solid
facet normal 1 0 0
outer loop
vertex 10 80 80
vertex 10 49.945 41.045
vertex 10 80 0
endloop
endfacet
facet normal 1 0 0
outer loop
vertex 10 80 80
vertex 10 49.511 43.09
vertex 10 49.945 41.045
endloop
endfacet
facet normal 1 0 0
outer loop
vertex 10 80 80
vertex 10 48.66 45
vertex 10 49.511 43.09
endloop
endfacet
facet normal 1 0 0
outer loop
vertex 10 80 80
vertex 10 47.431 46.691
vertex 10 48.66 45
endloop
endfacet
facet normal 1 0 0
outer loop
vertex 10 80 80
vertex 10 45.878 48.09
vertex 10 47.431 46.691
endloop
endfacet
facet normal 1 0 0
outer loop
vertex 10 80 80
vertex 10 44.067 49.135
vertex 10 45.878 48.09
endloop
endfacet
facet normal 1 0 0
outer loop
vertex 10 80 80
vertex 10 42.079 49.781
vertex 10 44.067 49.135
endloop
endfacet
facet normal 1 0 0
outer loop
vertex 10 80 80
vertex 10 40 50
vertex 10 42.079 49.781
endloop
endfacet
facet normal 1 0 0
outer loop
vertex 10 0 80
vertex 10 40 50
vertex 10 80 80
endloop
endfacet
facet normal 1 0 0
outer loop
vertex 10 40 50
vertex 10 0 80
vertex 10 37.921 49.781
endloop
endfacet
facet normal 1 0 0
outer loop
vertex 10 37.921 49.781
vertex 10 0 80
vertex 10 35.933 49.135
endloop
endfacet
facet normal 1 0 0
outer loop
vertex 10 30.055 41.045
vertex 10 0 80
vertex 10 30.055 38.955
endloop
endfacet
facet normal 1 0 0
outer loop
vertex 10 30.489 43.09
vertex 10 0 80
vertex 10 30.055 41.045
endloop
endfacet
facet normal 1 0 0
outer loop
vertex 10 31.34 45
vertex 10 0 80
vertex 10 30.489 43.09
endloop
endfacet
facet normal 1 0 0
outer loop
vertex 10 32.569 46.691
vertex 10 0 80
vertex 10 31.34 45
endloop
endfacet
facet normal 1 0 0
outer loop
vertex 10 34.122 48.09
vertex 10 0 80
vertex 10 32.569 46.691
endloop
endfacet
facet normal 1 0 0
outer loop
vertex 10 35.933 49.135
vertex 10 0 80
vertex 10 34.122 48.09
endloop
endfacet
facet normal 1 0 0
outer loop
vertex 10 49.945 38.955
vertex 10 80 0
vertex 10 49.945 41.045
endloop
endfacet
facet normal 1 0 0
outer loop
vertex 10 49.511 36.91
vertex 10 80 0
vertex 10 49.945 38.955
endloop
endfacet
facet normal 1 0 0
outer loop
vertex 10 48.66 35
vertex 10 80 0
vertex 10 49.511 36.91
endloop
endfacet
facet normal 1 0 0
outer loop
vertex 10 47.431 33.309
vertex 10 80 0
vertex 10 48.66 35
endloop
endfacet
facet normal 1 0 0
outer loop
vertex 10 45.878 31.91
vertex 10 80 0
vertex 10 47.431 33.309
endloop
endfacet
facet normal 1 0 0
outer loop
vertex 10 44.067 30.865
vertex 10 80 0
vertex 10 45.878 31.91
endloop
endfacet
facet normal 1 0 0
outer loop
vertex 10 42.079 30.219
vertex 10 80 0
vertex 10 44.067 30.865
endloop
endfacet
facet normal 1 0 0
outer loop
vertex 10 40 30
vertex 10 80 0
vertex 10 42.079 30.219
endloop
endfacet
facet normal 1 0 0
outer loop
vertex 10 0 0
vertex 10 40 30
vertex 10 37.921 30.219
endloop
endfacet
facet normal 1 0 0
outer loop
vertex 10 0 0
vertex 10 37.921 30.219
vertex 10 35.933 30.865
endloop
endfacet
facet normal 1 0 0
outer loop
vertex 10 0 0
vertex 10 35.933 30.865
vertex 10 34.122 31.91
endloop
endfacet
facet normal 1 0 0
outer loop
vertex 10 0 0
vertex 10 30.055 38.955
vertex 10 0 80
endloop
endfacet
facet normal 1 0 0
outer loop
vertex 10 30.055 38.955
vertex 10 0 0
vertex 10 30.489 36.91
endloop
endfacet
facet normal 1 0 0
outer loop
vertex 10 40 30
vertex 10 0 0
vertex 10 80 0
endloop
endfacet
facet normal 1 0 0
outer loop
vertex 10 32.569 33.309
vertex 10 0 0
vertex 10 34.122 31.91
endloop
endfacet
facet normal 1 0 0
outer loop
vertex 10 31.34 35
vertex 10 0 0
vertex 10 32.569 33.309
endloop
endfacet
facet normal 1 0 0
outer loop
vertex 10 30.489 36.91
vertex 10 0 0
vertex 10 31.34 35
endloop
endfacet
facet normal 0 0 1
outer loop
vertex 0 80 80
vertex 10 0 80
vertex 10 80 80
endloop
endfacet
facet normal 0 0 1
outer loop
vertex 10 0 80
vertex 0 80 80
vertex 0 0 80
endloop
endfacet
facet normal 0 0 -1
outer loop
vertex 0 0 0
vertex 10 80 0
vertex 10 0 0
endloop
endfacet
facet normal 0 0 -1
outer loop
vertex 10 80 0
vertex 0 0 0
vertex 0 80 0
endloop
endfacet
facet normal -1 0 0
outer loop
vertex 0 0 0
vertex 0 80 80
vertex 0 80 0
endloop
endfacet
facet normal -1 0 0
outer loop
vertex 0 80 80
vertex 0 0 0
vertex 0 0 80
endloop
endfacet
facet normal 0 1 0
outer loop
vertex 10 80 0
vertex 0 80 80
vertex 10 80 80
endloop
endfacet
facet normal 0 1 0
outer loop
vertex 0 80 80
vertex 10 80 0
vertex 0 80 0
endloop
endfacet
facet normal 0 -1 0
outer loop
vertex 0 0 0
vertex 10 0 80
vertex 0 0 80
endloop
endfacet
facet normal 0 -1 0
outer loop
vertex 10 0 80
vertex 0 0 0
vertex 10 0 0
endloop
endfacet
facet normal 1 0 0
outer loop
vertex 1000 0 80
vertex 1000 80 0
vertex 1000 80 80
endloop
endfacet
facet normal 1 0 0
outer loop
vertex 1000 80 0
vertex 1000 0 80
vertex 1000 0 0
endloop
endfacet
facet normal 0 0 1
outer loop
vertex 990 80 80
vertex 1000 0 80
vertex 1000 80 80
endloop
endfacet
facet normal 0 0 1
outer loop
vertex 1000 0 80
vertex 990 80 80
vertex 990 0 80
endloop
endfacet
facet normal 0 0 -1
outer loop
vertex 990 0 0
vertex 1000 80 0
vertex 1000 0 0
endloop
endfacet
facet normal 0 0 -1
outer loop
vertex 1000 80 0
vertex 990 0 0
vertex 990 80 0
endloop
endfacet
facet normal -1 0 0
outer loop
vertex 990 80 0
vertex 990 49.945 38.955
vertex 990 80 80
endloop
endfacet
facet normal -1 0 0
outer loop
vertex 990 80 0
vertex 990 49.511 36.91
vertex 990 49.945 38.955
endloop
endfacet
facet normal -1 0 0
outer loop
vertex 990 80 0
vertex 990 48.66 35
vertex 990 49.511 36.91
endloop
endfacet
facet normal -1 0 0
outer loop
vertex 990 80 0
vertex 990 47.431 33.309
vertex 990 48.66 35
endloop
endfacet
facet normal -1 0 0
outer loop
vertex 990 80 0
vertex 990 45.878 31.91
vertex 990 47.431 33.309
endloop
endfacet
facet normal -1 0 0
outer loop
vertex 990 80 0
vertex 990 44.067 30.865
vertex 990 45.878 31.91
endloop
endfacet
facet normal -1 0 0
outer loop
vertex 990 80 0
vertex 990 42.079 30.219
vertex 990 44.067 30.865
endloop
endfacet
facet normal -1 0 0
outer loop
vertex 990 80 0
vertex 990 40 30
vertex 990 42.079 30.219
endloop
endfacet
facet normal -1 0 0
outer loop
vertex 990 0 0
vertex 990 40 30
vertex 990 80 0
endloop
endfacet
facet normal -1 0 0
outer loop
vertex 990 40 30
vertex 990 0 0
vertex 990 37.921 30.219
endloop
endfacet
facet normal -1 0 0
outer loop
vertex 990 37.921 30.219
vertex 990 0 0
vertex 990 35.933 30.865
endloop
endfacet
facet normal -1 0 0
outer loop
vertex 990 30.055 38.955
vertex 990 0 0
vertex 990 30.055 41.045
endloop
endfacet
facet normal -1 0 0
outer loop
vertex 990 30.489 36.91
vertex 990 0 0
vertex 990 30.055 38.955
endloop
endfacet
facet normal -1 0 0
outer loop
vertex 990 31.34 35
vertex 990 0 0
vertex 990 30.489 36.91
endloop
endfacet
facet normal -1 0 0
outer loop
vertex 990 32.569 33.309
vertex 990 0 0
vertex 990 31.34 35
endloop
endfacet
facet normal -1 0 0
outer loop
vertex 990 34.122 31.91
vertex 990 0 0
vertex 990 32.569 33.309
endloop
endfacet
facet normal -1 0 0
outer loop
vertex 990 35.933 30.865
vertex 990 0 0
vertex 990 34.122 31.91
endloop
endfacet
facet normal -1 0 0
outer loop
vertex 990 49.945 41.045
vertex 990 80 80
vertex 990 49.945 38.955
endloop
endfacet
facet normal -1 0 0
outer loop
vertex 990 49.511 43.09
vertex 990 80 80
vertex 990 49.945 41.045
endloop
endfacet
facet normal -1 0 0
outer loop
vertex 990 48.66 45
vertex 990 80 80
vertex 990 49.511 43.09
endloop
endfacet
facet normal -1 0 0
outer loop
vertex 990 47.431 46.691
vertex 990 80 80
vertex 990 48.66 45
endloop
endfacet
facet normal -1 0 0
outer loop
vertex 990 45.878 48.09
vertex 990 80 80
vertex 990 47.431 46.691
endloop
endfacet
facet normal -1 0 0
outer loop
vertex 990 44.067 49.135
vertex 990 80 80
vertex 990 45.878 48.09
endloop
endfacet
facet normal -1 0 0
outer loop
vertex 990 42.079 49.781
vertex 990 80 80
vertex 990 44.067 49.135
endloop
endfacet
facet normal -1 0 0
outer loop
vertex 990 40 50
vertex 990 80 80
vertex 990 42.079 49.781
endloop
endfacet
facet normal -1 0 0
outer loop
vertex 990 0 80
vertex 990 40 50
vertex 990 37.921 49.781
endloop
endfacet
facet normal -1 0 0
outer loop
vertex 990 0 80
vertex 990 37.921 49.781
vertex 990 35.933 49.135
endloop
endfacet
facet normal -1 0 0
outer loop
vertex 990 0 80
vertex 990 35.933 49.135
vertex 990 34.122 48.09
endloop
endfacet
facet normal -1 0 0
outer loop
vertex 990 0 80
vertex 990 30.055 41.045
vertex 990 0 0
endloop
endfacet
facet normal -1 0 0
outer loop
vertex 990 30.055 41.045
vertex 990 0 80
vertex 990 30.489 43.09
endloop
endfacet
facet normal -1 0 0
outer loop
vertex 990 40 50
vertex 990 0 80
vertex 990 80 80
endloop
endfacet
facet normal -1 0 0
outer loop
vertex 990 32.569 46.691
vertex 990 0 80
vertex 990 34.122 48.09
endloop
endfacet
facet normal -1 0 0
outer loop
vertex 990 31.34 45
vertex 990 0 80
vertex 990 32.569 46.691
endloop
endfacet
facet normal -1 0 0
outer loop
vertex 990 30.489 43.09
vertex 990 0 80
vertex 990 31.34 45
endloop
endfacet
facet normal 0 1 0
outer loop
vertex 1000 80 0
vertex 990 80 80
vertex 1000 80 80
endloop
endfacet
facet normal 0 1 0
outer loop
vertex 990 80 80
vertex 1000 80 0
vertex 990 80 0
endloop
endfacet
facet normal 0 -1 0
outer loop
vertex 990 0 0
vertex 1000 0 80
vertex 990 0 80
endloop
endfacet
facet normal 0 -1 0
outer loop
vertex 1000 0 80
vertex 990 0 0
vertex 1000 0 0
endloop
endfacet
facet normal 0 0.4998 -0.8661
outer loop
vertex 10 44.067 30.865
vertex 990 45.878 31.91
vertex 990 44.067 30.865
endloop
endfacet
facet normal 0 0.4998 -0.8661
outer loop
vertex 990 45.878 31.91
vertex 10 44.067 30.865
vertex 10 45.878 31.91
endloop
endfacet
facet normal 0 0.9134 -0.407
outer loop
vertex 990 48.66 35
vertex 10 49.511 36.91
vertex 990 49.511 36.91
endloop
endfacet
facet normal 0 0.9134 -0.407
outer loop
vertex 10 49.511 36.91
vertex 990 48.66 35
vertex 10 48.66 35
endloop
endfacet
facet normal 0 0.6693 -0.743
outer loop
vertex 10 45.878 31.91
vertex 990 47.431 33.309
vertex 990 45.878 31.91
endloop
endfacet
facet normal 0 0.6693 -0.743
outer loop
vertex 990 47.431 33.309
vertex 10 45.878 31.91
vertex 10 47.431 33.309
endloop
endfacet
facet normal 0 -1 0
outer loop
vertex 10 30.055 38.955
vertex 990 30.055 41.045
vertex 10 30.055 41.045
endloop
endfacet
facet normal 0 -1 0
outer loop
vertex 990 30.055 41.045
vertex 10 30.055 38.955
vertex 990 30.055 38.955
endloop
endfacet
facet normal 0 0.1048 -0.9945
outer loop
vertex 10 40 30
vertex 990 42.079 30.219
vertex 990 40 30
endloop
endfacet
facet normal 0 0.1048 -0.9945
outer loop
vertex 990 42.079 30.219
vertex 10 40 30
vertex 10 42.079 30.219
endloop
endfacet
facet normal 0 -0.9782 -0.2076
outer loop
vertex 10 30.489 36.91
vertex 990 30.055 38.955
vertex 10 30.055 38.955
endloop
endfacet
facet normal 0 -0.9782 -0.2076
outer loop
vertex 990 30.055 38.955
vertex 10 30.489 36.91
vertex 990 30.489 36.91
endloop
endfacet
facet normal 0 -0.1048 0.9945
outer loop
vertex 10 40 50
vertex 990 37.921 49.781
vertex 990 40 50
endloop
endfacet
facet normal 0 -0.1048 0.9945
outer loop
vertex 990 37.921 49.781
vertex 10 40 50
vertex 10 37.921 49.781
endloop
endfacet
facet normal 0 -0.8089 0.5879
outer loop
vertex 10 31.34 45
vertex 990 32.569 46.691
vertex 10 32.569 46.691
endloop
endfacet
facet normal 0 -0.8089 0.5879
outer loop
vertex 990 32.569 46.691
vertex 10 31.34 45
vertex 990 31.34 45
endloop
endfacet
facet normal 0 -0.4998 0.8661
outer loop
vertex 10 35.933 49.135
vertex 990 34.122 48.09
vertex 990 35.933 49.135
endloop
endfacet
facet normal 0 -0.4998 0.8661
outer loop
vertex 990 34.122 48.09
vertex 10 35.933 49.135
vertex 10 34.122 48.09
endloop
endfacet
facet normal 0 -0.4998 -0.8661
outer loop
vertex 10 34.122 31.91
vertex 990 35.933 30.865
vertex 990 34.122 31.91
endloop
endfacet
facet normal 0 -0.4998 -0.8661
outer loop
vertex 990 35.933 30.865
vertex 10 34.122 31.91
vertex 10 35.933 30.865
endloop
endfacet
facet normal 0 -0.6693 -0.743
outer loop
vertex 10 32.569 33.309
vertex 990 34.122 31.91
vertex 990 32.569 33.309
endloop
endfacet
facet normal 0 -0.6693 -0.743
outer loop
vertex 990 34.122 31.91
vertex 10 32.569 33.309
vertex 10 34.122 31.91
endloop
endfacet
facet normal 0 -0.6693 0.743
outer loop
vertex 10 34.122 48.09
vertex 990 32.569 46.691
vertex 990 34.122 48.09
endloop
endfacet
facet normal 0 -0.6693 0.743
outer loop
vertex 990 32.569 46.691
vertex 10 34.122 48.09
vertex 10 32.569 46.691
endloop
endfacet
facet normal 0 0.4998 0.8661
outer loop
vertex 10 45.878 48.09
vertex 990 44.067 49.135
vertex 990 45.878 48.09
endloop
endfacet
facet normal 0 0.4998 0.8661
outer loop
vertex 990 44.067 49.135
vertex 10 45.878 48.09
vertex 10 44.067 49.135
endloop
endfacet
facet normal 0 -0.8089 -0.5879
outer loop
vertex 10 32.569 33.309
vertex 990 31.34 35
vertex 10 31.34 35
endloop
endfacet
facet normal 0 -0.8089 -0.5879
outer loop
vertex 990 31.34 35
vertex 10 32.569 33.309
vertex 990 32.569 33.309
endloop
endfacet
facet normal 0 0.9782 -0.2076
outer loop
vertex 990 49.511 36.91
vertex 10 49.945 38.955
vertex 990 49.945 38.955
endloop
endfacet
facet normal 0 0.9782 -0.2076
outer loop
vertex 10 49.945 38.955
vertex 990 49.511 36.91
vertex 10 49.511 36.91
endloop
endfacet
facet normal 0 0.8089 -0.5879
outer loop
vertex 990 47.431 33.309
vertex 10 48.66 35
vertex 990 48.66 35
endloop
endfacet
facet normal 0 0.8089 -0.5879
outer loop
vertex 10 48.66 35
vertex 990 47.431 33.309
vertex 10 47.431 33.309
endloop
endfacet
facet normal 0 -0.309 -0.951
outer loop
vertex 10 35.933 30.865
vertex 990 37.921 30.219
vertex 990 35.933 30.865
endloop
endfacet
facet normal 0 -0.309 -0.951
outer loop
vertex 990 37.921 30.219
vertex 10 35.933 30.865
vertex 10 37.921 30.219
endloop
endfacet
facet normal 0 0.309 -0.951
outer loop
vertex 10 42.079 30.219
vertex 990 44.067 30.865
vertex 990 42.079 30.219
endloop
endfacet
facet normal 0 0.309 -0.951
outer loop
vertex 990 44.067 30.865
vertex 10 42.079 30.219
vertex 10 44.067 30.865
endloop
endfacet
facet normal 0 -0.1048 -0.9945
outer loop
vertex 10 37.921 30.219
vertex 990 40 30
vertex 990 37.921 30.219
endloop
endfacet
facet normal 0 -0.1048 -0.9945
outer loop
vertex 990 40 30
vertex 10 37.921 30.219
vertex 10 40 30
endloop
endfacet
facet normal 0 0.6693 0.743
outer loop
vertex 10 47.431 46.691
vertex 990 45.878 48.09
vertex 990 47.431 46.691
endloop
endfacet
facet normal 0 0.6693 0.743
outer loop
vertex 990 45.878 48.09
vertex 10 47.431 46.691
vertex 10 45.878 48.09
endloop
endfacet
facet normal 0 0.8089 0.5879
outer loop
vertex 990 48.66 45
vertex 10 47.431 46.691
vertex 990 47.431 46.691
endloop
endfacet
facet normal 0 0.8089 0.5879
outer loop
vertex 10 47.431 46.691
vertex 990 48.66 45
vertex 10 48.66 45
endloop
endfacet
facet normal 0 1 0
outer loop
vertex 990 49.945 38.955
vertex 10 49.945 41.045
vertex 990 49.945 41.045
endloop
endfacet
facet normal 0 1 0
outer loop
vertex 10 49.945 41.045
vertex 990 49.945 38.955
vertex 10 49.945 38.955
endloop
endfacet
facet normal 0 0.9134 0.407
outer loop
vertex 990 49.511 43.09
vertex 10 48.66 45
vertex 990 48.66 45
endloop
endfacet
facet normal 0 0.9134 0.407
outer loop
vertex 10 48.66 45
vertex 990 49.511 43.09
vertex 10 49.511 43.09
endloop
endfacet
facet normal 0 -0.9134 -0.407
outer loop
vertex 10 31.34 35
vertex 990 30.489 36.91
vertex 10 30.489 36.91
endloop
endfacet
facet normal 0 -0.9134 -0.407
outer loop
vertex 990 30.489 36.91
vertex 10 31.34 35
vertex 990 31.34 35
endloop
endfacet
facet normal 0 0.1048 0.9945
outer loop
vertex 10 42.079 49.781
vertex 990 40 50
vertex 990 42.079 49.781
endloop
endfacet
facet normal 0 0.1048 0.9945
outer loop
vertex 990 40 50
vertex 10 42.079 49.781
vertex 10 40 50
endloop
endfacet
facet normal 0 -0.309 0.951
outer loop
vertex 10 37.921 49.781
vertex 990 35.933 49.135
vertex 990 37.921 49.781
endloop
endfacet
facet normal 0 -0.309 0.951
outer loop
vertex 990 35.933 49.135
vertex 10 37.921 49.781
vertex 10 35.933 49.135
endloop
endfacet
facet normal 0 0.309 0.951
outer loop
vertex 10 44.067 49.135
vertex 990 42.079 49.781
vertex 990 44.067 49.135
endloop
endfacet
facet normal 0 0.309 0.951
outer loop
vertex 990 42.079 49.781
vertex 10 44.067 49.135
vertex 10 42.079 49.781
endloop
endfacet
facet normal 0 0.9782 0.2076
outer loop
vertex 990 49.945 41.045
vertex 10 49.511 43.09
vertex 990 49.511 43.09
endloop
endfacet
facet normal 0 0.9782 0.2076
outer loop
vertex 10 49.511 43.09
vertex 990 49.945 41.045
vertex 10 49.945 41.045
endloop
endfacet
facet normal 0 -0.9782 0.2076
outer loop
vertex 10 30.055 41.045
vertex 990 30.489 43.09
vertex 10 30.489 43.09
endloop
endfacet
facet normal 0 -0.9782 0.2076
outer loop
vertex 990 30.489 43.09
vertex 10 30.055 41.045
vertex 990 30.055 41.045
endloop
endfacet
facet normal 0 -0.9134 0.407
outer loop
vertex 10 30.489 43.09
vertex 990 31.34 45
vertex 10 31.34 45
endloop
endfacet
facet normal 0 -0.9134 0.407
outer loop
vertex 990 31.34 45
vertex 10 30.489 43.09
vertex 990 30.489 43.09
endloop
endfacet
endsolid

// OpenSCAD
/*

    Hanger
    
    By Anton Augustsson


*/



module hanger (
    rodDiameter,
    rodLength,
    x,y,z
    ){
/*
    ---------- Local varibles ---------- 
*/

mountWidth = rodDiameter*4;
mountThickness = rodDiameter/2;
        
/*
    ---------- Code ---------- 
*/

color("BurlyWood")
translate([
    x,
    y,
    z]) 
union () {
    
// Left mount width
translate([
    0,
    0,
    0]) 
cube(size = [
    mountThickness,
    mountWidth,
    mountWidth]);

// Right mount width
translate([
    rodLength-mountThickness,
    0,
    0]) 
cube(size = [
    mountThickness,
    mountWidth,
    mountWidth]);

translate([
    0,                   
    mountWidth/2,   
    mountWidth/2
    ])  
rotate([0,90,0])
cylinder(
    h = rodLength,
    r = rodDiameter/2
    );      
}}
    
/*
    ---------- Example ---------- 
*/


thicknessBottom = 14;
thicknessSide   = 14;
thicknessFront  = 20;

length = 500;
width  = 600;
height = 100;


x=0;
y=0;
z=0;
yRotate=0;

hanger (
    20,
    1000,
    x,y,z
    );
